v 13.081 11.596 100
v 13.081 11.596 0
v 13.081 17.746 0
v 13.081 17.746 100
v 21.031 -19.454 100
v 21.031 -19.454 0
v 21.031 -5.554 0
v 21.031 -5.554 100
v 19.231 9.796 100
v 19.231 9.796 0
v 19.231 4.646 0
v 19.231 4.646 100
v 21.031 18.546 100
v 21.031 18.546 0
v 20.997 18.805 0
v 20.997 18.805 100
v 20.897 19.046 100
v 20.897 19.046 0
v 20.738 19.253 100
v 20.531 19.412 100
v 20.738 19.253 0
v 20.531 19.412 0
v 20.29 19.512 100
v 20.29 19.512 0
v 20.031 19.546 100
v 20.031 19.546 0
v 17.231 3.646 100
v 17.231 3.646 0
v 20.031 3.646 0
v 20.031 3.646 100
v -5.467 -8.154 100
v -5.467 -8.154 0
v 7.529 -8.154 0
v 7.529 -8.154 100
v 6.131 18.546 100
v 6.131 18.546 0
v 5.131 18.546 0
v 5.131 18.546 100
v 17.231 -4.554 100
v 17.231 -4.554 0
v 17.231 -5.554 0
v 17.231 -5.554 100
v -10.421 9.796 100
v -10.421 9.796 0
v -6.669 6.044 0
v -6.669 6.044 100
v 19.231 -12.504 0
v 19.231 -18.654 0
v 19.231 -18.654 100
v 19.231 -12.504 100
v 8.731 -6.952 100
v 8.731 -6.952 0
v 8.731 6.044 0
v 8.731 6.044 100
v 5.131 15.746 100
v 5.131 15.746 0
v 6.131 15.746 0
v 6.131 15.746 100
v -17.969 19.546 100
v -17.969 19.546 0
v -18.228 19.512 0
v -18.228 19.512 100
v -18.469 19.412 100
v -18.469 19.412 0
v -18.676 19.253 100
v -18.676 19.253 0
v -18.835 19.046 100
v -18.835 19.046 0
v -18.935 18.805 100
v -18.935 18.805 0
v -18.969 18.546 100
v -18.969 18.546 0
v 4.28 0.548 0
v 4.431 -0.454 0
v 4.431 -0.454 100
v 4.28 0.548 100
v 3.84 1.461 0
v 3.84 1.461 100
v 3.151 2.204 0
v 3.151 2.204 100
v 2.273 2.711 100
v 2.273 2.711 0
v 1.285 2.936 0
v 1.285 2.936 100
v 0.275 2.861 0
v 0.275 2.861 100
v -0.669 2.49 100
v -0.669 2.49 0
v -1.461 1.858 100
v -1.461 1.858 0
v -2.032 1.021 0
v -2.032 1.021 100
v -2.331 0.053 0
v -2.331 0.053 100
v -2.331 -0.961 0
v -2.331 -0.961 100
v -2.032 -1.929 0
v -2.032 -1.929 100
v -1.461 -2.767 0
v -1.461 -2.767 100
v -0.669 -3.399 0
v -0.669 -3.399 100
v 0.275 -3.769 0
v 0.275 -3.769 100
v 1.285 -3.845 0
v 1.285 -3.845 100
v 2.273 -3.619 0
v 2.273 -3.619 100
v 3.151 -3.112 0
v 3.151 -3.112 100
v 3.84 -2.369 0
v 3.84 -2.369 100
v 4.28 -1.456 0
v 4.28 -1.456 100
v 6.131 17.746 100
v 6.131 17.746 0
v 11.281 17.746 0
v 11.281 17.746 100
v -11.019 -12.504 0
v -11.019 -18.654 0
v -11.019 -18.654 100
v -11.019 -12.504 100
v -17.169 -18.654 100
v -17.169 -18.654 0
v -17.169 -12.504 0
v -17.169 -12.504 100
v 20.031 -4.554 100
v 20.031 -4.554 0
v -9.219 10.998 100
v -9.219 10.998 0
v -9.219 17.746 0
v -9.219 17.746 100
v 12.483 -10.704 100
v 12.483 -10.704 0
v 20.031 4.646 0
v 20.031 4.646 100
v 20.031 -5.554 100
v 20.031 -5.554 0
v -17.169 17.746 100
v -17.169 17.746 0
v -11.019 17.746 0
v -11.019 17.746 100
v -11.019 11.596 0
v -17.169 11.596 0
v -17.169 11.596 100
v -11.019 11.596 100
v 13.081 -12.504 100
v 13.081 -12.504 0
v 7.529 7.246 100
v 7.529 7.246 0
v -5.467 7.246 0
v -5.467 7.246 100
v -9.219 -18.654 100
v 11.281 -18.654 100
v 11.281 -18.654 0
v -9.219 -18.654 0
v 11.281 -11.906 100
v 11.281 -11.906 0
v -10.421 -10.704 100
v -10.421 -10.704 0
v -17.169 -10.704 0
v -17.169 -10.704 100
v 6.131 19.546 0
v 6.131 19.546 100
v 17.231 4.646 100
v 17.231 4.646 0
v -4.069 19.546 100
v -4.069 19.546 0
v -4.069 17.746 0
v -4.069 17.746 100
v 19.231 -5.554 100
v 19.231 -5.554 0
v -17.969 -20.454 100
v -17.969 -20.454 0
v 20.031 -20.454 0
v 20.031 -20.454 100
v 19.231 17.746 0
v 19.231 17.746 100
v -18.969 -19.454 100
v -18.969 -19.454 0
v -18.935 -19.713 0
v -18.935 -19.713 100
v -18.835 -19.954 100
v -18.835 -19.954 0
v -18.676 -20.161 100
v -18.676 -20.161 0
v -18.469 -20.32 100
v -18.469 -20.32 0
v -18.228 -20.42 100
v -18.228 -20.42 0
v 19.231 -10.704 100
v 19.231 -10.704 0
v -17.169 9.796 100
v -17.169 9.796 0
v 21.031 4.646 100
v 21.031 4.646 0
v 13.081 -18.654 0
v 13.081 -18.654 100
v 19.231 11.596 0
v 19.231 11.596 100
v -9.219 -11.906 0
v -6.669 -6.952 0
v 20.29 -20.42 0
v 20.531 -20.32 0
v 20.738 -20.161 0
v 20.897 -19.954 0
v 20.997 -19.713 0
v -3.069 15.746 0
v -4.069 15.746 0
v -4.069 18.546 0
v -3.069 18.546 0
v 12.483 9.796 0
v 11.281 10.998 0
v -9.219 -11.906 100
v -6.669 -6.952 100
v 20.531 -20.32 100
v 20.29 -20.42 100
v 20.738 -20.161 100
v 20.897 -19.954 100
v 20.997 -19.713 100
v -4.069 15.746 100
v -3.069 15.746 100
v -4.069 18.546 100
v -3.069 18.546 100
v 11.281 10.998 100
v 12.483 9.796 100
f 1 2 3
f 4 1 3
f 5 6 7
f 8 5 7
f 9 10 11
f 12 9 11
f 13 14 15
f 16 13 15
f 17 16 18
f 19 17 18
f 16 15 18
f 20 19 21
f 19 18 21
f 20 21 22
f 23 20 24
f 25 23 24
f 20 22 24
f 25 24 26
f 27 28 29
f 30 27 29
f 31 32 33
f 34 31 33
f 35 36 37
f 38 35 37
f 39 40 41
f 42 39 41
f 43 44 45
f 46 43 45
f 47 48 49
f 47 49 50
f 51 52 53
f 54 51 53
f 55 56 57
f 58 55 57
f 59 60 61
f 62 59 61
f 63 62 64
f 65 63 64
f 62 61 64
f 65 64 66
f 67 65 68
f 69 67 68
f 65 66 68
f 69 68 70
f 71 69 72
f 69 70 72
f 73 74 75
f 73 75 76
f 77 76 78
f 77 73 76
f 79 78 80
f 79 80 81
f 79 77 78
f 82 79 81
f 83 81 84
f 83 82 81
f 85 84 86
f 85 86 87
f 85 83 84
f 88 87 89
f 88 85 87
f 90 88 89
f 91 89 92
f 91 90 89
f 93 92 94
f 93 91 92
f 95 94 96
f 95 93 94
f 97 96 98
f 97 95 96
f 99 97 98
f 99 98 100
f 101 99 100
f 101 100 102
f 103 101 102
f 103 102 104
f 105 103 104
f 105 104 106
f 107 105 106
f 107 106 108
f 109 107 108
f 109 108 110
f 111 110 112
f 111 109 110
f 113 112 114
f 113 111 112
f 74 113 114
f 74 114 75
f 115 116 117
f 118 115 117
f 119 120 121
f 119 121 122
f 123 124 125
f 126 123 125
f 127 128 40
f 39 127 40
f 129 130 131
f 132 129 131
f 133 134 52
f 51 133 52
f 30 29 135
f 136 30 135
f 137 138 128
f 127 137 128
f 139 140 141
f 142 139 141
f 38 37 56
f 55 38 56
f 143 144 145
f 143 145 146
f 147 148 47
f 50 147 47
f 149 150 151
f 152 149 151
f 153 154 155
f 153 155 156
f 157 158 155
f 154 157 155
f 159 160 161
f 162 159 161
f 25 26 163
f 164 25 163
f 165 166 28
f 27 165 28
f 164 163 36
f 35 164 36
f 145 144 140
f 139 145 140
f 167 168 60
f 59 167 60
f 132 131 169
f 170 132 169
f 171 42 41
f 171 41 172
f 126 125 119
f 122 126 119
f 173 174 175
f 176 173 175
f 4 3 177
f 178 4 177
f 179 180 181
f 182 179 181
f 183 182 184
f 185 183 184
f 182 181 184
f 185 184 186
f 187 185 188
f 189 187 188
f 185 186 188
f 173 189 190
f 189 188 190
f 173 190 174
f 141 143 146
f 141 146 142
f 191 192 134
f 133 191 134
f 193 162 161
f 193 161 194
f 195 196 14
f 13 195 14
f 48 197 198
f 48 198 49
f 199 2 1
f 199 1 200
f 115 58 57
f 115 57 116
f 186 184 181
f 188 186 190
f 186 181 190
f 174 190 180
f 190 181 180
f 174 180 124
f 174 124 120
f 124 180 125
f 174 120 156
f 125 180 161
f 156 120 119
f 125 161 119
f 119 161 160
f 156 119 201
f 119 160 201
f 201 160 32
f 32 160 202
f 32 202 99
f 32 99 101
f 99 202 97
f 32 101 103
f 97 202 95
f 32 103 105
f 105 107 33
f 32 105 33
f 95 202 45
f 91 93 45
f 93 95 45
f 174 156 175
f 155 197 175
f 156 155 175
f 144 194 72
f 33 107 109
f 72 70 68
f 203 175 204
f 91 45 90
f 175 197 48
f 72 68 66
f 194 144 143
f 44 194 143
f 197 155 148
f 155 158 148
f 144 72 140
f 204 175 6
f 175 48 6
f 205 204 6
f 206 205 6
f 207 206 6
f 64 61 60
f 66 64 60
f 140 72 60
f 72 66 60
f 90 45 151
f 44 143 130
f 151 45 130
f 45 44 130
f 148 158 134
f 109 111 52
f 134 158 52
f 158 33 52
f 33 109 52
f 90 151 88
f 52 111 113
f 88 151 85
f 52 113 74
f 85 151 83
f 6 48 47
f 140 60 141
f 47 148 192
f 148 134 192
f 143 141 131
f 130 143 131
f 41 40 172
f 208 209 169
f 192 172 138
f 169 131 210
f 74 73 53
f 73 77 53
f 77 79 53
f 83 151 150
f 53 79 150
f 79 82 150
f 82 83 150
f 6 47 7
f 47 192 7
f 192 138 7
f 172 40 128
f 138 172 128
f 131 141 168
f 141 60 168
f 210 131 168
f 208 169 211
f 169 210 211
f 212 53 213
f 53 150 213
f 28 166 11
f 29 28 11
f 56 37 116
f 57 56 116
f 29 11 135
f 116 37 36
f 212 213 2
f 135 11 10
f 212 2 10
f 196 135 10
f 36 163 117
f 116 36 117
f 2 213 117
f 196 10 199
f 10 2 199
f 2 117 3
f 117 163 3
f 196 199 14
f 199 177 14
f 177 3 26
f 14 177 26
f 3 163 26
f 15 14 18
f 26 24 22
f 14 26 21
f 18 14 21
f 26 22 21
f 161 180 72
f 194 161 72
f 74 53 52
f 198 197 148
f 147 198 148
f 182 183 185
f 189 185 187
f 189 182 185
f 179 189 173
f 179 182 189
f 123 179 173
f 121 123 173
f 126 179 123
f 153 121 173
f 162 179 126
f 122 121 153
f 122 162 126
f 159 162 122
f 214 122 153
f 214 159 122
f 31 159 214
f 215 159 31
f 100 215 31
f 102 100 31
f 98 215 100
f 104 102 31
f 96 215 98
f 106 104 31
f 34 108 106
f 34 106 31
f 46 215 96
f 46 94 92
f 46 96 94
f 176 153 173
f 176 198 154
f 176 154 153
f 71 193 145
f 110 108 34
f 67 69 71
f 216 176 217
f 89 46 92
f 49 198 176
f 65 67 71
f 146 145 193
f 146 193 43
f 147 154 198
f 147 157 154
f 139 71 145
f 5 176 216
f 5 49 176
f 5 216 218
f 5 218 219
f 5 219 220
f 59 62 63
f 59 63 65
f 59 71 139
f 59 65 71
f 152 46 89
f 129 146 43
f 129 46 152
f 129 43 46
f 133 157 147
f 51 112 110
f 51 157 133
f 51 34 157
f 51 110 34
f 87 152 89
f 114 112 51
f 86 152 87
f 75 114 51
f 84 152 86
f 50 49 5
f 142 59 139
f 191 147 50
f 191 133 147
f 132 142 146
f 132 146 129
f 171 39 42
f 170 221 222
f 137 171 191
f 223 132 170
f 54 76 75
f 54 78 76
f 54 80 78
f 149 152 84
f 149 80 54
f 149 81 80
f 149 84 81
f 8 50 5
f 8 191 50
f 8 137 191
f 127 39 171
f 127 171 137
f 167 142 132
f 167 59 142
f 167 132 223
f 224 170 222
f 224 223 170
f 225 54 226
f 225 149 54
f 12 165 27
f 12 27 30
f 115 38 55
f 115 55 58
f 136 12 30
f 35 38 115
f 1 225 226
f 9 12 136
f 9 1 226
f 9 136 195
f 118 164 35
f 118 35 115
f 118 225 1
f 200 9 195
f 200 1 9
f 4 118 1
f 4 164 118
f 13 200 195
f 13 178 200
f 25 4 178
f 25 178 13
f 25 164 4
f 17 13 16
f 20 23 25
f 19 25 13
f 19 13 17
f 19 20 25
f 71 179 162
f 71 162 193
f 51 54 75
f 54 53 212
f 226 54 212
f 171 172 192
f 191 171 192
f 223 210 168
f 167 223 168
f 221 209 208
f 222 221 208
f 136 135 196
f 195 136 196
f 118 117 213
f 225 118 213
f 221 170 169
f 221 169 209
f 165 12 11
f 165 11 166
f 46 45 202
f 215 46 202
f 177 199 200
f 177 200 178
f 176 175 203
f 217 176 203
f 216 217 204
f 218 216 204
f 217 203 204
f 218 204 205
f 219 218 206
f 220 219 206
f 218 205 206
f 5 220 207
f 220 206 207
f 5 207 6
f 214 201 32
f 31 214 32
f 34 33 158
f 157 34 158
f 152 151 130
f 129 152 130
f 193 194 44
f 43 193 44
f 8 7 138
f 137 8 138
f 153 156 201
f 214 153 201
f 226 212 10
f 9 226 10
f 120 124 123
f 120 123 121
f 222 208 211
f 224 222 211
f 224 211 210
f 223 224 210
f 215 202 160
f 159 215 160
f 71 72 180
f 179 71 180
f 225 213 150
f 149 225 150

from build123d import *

# Parameters (mm, degrees)
SKETCH_1_R      = 3.4
SKETCH_1_W      = 6.15
SKETCH_1_H      = 6.15
EXTRUDE_1_DEPTH = 100


with BuildPart() as part:
    # 草图1 → 凸台-拉伸1 (new body)
    with BuildSketch(Plane.XY):
        with BuildLine():
            Line((-4.068782805, 19.545792426), (-17.968782805, 19.545792426))
            ThreePointArc((-17.968782805, 19.545792426), (-18.675889586, 19.252899208), (-18.968782805, 18.545792426))
            Line((-18.968782805, 18.545792426), (-18.968782805, 4.645792426))
            Line((-18.968782805, 4.645792426), (-18.968782805, -5.554207574))
            Line((-18.968782805, -5.554207574), (-18.968782805, -19.454207574))
            ThreePointArc((-18.968782805, -19.454207574), (-18.675889586, -20.161314355), (-17.968782805, -20.454207574))
            Line((-17.968782805, -20.454207574), (20.031217195, -20.454207574))
            ThreePointArc((20.031217195, -20.454207574), (20.738323976, -20.161314355), (21.031217195, -19.454207574))
            Line((21.031217195, -19.454207574), (21.031217195, -5.554207574))
            Line((21.031217195, -5.554207574), (20.031217195, -5.554207574))
            Line((20.031217195, -5.554207574), (20.031217195, -4.554207574))
            Line((20.031217195, -4.554207574), (17.231217195, -4.554207574))
            Line((17.231217195, -4.554207574), (17.231217195, -5.554207574))
            Line((17.231217195, -5.554207574), (19.231217195, -5.554207574))
            Line((19.231217195, -5.554207574), (19.231217195, -10.704207574))
            Line((19.231217195, -10.704207574), (12.483298723, -10.704207574))
            Line((12.483298723, -10.704207574), (8.731217195, -6.952126046))
            Line((8.731217195, -6.952126046), (8.731217195, 6.043710898))
            Line((8.731217195, 6.043710898), (12.483298723, 9.795792426))
            Line((12.483298723, 9.795792426), (19.231217195, 9.795792426))
            Line((19.231217195, 9.795792426), (19.231217195, 4.645792426))
            Line((19.231217195, 4.645792426), (17.231217195, 4.645792426))
            Line((17.231217195, 4.645792426), (17.231217195, 3.645792426))
            Line((17.231217195, 3.645792426), (20.031217195, 3.645792426))
            Line((20.031217195, 3.645792426), (20.031217195, 4.645792426))
            Line((20.031217195, 4.645792426), (21.031217195, 4.645792426))
            Line((21.031217195, 4.645792426), (21.031217195, 18.545792426))
            ThreePointArc((21.031217195, 18.545792426), (20.738323976, 19.252899208), (20.031217195, 19.545792426))
            Line((20.031217195, 19.545792426), (6.131217195, 19.545792426))
            Line((6.131217195, 19.545792426), (6.131217195, 18.545792426))
            Line((6.131217195, 18.545792426), (5.131217195, 18.545792426))
            Line((5.131217195, 18.545792426), (5.131217195, 15.745792426))
            Line((5.131217195, 15.745792426), (6.131217195, 15.745792426))
            Line((6.131217195, 15.745792426), (6.131217195, 17.745792426))
            Line((6.131217195, 17.745792426), (11.281217195, 17.745792426))
            Line((11.281217195, 17.745792426), (11.281217195, 10.997873954))
            Line((11.281217195, 10.997873954), (7.529135667, 7.245792426))
            Line((7.529135667, 7.245792426), (-5.466701277, 7.245792426))
            Line((-5.466701277, 7.245792426), (-9.218782805, 10.997873954))
            Line((-9.218782805, 10.997873954), (-9.218782805, 17.745792426))
            Line((-9.218782805, 17.745792426), (-4.068782805, 17.745792426))
            Line((-4.068782805, 17.745792426), (-4.068782805, 15.745792426))
            Line((-4.068782805, 15.745792426), (-3.068782805, 15.745792426))
            Line((-3.068782805, 15.745792426), (-3.068782805, 18.545792426))
            Line((-3.068782805, 18.545792426), (-4.068782805, 18.545792426))
            Line((-4.068782805, 18.545792426), (-4.068782805, 19.545792426))
        make_face()
        with Locations((1.031217195, -0.454207574)):
            Circle(SKETCH_1_R, mode=Mode.SUBTRACT)
        with Locations((-14.093782805, 14.670792426)):
            Rectangle(SKETCH_1_W, SKETCH_1_H, mode=Mode.SUBTRACT)
        Polygon((-6.668782805, 6.043710898), (-6.668782805, -6.952126046), (-10.420864333, -10.704207574), (-17.168782805, -10.704207574), (-17.168782805, 9.795792426), (-10.420864333, 9.795792426), align=None, mode=Mode.SUBTRACT)
        Polygon((-5.466701277, -8.154207574), (7.529135667, -8.154207574), (11.281217195, -11.906289102), (11.281217195, -18.654207574), (-9.218782805, -18.654207574), (-9.218782805, -11.906289102), align=None, mode=Mode.SUBTRACT)
        with Locations((16.156217195, 14.670792426)):
            Rectangle(SKETCH_1_W, SKETCH_1_H, mode=Mode.SUBTRACT)
        with Locations((-14.093782805, -15.579207574)):
            Rectangle(SKETCH_1_W, SKETCH_1_H, mode=Mode.SUBTRACT)
        with Locations((16.156217195, -15.579207574)):
            Rectangle(SKETCH_1_W, SKETCH_1_H, mode=Mode.SUBTRACT)
    extrude(amount=EXTRUDE_1_DEPTH)


solid = part.part
